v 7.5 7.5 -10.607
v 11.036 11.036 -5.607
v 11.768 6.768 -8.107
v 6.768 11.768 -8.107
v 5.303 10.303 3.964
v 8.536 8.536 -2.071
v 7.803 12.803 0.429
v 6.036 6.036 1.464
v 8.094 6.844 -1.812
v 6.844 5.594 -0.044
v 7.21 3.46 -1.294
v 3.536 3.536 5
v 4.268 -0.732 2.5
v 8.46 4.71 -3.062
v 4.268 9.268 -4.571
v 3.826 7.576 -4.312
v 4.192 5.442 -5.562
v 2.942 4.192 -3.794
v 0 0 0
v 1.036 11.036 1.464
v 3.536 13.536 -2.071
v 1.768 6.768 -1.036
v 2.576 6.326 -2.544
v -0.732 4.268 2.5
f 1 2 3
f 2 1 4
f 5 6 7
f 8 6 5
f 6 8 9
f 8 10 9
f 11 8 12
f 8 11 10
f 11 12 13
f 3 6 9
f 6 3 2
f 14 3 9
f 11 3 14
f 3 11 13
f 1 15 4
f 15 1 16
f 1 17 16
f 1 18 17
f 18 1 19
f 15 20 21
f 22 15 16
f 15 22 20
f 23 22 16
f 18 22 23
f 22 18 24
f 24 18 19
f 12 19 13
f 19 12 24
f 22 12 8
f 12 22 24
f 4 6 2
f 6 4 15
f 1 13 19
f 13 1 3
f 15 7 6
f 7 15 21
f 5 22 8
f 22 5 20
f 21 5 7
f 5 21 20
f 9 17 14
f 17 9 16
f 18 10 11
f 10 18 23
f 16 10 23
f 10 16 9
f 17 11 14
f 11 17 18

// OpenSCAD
module bausteint(){

    difference(){
        union(){
            cube([3,1,1]);
            translate([1,1,0])
                cube([1,1,1]);
        }
        translate([1.25,0.25,-0.01])
            cube([0.5,0.5,1.04]);
 }
 }

rotate([45,45,45])
    scale(5)
        bausteint();
 
